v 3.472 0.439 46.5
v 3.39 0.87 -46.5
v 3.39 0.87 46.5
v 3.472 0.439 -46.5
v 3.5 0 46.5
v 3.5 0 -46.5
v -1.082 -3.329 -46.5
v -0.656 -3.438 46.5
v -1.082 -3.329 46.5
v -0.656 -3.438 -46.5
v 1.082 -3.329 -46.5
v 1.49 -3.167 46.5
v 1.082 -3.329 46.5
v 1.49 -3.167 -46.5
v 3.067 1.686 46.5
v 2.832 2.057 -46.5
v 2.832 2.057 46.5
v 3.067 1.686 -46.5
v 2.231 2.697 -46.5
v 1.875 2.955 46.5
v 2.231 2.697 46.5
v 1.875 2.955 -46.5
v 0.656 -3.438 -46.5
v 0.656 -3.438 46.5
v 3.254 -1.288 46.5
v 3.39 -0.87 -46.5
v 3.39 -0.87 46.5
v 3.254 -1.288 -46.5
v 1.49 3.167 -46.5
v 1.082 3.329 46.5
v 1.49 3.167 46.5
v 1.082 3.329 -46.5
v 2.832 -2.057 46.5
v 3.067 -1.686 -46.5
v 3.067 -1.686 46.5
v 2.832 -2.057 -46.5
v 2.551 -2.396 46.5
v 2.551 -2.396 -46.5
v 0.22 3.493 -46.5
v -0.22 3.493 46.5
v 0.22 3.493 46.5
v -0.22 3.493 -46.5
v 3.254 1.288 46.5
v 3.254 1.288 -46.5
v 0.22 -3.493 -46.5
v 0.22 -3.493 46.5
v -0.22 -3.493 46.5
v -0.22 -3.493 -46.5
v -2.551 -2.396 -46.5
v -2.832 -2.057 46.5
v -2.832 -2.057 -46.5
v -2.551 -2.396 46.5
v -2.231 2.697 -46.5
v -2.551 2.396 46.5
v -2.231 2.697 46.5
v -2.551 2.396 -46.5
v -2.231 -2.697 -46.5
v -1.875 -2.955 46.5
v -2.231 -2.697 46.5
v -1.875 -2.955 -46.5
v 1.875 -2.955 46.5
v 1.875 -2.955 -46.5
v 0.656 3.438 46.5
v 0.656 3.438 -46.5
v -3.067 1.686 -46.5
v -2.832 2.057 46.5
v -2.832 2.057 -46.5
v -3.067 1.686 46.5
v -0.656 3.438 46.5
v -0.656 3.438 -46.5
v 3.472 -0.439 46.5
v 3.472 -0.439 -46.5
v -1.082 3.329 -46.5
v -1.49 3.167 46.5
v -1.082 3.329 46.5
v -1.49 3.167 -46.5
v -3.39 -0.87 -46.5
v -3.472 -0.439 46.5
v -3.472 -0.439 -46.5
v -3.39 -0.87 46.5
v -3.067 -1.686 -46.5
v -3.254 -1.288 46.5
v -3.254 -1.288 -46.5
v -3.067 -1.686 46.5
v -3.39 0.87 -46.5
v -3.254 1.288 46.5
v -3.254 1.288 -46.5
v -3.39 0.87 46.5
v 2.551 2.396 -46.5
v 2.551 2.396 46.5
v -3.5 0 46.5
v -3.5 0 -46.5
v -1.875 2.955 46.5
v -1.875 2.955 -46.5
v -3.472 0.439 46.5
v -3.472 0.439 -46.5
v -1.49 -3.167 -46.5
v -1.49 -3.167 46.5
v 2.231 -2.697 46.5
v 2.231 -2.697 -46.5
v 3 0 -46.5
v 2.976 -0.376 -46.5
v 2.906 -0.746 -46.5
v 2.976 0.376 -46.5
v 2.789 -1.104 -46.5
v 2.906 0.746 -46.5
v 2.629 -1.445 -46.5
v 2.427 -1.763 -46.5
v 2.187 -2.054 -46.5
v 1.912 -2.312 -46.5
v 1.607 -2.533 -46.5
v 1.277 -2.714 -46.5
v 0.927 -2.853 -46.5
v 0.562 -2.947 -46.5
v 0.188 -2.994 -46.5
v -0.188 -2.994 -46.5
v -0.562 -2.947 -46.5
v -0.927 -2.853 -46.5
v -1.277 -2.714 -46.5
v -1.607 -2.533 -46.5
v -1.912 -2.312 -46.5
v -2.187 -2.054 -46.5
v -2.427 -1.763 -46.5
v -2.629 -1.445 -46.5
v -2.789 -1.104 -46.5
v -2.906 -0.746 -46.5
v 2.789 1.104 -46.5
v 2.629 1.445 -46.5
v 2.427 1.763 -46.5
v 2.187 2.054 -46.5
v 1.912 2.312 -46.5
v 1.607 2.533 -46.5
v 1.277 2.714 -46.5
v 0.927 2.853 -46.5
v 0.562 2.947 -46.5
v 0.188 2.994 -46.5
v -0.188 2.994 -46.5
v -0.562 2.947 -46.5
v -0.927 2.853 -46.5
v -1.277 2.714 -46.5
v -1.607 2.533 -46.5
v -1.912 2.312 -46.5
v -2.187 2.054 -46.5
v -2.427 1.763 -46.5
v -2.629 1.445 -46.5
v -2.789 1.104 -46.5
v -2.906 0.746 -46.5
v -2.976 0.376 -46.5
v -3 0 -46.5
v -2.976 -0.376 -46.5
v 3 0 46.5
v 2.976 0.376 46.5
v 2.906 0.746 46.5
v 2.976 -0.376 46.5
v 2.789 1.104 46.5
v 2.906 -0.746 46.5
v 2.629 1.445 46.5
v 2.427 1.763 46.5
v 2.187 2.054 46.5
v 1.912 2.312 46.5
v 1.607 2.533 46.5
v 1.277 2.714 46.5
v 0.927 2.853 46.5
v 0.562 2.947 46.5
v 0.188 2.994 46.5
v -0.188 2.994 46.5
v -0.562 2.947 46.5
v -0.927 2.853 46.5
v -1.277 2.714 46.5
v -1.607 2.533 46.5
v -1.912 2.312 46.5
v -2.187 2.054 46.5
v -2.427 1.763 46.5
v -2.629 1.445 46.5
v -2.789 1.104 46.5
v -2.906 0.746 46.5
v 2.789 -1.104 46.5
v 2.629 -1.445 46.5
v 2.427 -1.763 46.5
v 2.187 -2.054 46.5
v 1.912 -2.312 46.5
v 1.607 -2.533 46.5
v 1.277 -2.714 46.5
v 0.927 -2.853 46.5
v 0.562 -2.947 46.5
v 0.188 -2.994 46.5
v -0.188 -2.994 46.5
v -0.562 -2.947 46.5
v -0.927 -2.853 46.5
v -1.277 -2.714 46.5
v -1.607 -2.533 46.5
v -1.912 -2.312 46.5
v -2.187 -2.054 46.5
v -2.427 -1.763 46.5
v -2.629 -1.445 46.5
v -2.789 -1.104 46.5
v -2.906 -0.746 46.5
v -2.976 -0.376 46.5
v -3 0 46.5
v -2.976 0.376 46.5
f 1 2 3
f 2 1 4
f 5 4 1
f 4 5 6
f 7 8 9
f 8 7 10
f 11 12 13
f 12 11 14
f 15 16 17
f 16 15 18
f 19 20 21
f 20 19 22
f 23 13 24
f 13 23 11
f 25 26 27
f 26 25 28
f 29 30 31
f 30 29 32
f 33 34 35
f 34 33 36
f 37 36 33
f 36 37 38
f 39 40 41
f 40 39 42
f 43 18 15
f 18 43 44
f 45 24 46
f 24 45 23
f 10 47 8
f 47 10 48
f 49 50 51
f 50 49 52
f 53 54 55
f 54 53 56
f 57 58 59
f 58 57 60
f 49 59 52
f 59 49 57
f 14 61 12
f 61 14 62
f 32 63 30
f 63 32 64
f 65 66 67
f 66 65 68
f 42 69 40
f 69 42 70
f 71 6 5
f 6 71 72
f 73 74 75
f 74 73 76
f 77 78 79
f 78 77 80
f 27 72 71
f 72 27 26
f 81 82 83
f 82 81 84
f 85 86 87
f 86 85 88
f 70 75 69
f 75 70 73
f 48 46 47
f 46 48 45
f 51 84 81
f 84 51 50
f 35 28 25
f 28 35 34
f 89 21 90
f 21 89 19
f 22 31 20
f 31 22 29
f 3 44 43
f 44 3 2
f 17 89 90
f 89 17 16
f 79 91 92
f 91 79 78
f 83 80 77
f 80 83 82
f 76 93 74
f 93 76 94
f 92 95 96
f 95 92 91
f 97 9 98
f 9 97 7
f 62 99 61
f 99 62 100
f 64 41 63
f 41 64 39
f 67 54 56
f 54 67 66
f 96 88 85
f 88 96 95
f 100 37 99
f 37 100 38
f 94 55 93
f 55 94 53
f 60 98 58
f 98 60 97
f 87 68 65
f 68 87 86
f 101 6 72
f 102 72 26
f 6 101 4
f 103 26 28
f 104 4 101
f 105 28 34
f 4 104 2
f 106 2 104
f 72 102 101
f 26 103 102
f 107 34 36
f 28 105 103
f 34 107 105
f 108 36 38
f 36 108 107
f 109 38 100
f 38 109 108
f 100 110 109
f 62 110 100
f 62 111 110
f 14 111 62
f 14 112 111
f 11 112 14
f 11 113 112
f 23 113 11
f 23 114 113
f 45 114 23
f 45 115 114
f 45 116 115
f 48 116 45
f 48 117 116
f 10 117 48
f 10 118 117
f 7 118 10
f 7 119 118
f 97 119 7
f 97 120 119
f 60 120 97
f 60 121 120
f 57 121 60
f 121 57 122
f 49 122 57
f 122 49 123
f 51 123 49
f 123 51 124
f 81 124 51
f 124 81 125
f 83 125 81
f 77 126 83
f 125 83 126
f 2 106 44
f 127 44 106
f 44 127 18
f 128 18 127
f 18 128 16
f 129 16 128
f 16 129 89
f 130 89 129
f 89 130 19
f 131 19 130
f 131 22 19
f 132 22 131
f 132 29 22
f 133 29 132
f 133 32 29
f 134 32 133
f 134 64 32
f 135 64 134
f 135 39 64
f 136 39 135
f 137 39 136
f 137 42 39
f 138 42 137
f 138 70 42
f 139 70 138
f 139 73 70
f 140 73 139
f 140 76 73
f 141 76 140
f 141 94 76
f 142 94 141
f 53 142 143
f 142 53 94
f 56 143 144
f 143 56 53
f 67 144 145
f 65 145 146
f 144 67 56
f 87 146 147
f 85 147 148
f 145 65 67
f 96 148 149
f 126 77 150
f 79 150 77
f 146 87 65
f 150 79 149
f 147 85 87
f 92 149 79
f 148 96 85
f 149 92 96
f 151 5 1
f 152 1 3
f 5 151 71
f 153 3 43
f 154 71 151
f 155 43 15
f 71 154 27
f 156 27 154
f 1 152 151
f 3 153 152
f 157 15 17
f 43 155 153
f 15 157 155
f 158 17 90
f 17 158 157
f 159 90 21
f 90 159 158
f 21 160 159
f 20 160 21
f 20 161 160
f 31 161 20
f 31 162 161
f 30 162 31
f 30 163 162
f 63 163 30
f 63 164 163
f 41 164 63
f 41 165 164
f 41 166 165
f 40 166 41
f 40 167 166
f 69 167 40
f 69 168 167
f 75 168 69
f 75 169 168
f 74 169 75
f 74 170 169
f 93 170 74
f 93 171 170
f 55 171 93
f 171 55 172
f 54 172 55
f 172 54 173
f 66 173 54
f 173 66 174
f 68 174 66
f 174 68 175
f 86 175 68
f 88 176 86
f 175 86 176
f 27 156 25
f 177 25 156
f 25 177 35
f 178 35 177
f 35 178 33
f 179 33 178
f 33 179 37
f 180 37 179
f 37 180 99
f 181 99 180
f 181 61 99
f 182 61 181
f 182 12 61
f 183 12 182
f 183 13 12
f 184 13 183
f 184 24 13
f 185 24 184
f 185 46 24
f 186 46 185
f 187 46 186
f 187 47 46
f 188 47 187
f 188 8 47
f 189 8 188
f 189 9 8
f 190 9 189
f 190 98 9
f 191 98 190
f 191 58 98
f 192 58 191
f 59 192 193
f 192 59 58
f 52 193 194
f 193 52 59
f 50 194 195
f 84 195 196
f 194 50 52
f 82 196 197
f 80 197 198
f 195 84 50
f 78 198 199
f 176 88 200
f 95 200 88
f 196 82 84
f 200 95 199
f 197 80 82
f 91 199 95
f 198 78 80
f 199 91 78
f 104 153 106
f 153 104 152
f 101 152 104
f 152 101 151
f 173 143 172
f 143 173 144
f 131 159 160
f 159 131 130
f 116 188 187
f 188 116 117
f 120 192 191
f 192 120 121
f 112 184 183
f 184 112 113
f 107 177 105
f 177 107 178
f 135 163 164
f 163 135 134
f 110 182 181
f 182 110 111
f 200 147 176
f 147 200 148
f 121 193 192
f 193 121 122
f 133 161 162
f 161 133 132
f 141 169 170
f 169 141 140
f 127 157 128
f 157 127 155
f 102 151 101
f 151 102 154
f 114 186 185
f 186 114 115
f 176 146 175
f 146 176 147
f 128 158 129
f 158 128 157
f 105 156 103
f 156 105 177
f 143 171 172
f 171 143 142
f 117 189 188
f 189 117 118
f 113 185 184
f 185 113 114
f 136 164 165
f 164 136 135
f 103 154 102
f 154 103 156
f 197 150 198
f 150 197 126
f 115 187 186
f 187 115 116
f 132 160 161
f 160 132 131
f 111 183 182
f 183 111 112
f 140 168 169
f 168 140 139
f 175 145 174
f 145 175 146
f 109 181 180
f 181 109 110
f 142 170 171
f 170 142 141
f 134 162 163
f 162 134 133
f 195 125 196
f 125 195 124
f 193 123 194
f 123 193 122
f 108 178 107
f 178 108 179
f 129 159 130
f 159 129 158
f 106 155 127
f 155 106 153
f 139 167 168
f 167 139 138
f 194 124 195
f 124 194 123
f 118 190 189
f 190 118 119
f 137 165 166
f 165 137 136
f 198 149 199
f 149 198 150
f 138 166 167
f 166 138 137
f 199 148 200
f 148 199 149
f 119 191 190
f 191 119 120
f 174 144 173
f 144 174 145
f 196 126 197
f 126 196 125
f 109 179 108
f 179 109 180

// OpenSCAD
$fn = 50;


difference() {
	union() {
		translate(v = [0, 0, -46.5000000000]) {
			cylinder(h = 93, r = 3.5000000000);
		}
	}
	union() {
		translate(v = [0, 0, -100.0000000000]) {
			cylinder(h = 200, r = 3.0000000000);
		}
	}
}
